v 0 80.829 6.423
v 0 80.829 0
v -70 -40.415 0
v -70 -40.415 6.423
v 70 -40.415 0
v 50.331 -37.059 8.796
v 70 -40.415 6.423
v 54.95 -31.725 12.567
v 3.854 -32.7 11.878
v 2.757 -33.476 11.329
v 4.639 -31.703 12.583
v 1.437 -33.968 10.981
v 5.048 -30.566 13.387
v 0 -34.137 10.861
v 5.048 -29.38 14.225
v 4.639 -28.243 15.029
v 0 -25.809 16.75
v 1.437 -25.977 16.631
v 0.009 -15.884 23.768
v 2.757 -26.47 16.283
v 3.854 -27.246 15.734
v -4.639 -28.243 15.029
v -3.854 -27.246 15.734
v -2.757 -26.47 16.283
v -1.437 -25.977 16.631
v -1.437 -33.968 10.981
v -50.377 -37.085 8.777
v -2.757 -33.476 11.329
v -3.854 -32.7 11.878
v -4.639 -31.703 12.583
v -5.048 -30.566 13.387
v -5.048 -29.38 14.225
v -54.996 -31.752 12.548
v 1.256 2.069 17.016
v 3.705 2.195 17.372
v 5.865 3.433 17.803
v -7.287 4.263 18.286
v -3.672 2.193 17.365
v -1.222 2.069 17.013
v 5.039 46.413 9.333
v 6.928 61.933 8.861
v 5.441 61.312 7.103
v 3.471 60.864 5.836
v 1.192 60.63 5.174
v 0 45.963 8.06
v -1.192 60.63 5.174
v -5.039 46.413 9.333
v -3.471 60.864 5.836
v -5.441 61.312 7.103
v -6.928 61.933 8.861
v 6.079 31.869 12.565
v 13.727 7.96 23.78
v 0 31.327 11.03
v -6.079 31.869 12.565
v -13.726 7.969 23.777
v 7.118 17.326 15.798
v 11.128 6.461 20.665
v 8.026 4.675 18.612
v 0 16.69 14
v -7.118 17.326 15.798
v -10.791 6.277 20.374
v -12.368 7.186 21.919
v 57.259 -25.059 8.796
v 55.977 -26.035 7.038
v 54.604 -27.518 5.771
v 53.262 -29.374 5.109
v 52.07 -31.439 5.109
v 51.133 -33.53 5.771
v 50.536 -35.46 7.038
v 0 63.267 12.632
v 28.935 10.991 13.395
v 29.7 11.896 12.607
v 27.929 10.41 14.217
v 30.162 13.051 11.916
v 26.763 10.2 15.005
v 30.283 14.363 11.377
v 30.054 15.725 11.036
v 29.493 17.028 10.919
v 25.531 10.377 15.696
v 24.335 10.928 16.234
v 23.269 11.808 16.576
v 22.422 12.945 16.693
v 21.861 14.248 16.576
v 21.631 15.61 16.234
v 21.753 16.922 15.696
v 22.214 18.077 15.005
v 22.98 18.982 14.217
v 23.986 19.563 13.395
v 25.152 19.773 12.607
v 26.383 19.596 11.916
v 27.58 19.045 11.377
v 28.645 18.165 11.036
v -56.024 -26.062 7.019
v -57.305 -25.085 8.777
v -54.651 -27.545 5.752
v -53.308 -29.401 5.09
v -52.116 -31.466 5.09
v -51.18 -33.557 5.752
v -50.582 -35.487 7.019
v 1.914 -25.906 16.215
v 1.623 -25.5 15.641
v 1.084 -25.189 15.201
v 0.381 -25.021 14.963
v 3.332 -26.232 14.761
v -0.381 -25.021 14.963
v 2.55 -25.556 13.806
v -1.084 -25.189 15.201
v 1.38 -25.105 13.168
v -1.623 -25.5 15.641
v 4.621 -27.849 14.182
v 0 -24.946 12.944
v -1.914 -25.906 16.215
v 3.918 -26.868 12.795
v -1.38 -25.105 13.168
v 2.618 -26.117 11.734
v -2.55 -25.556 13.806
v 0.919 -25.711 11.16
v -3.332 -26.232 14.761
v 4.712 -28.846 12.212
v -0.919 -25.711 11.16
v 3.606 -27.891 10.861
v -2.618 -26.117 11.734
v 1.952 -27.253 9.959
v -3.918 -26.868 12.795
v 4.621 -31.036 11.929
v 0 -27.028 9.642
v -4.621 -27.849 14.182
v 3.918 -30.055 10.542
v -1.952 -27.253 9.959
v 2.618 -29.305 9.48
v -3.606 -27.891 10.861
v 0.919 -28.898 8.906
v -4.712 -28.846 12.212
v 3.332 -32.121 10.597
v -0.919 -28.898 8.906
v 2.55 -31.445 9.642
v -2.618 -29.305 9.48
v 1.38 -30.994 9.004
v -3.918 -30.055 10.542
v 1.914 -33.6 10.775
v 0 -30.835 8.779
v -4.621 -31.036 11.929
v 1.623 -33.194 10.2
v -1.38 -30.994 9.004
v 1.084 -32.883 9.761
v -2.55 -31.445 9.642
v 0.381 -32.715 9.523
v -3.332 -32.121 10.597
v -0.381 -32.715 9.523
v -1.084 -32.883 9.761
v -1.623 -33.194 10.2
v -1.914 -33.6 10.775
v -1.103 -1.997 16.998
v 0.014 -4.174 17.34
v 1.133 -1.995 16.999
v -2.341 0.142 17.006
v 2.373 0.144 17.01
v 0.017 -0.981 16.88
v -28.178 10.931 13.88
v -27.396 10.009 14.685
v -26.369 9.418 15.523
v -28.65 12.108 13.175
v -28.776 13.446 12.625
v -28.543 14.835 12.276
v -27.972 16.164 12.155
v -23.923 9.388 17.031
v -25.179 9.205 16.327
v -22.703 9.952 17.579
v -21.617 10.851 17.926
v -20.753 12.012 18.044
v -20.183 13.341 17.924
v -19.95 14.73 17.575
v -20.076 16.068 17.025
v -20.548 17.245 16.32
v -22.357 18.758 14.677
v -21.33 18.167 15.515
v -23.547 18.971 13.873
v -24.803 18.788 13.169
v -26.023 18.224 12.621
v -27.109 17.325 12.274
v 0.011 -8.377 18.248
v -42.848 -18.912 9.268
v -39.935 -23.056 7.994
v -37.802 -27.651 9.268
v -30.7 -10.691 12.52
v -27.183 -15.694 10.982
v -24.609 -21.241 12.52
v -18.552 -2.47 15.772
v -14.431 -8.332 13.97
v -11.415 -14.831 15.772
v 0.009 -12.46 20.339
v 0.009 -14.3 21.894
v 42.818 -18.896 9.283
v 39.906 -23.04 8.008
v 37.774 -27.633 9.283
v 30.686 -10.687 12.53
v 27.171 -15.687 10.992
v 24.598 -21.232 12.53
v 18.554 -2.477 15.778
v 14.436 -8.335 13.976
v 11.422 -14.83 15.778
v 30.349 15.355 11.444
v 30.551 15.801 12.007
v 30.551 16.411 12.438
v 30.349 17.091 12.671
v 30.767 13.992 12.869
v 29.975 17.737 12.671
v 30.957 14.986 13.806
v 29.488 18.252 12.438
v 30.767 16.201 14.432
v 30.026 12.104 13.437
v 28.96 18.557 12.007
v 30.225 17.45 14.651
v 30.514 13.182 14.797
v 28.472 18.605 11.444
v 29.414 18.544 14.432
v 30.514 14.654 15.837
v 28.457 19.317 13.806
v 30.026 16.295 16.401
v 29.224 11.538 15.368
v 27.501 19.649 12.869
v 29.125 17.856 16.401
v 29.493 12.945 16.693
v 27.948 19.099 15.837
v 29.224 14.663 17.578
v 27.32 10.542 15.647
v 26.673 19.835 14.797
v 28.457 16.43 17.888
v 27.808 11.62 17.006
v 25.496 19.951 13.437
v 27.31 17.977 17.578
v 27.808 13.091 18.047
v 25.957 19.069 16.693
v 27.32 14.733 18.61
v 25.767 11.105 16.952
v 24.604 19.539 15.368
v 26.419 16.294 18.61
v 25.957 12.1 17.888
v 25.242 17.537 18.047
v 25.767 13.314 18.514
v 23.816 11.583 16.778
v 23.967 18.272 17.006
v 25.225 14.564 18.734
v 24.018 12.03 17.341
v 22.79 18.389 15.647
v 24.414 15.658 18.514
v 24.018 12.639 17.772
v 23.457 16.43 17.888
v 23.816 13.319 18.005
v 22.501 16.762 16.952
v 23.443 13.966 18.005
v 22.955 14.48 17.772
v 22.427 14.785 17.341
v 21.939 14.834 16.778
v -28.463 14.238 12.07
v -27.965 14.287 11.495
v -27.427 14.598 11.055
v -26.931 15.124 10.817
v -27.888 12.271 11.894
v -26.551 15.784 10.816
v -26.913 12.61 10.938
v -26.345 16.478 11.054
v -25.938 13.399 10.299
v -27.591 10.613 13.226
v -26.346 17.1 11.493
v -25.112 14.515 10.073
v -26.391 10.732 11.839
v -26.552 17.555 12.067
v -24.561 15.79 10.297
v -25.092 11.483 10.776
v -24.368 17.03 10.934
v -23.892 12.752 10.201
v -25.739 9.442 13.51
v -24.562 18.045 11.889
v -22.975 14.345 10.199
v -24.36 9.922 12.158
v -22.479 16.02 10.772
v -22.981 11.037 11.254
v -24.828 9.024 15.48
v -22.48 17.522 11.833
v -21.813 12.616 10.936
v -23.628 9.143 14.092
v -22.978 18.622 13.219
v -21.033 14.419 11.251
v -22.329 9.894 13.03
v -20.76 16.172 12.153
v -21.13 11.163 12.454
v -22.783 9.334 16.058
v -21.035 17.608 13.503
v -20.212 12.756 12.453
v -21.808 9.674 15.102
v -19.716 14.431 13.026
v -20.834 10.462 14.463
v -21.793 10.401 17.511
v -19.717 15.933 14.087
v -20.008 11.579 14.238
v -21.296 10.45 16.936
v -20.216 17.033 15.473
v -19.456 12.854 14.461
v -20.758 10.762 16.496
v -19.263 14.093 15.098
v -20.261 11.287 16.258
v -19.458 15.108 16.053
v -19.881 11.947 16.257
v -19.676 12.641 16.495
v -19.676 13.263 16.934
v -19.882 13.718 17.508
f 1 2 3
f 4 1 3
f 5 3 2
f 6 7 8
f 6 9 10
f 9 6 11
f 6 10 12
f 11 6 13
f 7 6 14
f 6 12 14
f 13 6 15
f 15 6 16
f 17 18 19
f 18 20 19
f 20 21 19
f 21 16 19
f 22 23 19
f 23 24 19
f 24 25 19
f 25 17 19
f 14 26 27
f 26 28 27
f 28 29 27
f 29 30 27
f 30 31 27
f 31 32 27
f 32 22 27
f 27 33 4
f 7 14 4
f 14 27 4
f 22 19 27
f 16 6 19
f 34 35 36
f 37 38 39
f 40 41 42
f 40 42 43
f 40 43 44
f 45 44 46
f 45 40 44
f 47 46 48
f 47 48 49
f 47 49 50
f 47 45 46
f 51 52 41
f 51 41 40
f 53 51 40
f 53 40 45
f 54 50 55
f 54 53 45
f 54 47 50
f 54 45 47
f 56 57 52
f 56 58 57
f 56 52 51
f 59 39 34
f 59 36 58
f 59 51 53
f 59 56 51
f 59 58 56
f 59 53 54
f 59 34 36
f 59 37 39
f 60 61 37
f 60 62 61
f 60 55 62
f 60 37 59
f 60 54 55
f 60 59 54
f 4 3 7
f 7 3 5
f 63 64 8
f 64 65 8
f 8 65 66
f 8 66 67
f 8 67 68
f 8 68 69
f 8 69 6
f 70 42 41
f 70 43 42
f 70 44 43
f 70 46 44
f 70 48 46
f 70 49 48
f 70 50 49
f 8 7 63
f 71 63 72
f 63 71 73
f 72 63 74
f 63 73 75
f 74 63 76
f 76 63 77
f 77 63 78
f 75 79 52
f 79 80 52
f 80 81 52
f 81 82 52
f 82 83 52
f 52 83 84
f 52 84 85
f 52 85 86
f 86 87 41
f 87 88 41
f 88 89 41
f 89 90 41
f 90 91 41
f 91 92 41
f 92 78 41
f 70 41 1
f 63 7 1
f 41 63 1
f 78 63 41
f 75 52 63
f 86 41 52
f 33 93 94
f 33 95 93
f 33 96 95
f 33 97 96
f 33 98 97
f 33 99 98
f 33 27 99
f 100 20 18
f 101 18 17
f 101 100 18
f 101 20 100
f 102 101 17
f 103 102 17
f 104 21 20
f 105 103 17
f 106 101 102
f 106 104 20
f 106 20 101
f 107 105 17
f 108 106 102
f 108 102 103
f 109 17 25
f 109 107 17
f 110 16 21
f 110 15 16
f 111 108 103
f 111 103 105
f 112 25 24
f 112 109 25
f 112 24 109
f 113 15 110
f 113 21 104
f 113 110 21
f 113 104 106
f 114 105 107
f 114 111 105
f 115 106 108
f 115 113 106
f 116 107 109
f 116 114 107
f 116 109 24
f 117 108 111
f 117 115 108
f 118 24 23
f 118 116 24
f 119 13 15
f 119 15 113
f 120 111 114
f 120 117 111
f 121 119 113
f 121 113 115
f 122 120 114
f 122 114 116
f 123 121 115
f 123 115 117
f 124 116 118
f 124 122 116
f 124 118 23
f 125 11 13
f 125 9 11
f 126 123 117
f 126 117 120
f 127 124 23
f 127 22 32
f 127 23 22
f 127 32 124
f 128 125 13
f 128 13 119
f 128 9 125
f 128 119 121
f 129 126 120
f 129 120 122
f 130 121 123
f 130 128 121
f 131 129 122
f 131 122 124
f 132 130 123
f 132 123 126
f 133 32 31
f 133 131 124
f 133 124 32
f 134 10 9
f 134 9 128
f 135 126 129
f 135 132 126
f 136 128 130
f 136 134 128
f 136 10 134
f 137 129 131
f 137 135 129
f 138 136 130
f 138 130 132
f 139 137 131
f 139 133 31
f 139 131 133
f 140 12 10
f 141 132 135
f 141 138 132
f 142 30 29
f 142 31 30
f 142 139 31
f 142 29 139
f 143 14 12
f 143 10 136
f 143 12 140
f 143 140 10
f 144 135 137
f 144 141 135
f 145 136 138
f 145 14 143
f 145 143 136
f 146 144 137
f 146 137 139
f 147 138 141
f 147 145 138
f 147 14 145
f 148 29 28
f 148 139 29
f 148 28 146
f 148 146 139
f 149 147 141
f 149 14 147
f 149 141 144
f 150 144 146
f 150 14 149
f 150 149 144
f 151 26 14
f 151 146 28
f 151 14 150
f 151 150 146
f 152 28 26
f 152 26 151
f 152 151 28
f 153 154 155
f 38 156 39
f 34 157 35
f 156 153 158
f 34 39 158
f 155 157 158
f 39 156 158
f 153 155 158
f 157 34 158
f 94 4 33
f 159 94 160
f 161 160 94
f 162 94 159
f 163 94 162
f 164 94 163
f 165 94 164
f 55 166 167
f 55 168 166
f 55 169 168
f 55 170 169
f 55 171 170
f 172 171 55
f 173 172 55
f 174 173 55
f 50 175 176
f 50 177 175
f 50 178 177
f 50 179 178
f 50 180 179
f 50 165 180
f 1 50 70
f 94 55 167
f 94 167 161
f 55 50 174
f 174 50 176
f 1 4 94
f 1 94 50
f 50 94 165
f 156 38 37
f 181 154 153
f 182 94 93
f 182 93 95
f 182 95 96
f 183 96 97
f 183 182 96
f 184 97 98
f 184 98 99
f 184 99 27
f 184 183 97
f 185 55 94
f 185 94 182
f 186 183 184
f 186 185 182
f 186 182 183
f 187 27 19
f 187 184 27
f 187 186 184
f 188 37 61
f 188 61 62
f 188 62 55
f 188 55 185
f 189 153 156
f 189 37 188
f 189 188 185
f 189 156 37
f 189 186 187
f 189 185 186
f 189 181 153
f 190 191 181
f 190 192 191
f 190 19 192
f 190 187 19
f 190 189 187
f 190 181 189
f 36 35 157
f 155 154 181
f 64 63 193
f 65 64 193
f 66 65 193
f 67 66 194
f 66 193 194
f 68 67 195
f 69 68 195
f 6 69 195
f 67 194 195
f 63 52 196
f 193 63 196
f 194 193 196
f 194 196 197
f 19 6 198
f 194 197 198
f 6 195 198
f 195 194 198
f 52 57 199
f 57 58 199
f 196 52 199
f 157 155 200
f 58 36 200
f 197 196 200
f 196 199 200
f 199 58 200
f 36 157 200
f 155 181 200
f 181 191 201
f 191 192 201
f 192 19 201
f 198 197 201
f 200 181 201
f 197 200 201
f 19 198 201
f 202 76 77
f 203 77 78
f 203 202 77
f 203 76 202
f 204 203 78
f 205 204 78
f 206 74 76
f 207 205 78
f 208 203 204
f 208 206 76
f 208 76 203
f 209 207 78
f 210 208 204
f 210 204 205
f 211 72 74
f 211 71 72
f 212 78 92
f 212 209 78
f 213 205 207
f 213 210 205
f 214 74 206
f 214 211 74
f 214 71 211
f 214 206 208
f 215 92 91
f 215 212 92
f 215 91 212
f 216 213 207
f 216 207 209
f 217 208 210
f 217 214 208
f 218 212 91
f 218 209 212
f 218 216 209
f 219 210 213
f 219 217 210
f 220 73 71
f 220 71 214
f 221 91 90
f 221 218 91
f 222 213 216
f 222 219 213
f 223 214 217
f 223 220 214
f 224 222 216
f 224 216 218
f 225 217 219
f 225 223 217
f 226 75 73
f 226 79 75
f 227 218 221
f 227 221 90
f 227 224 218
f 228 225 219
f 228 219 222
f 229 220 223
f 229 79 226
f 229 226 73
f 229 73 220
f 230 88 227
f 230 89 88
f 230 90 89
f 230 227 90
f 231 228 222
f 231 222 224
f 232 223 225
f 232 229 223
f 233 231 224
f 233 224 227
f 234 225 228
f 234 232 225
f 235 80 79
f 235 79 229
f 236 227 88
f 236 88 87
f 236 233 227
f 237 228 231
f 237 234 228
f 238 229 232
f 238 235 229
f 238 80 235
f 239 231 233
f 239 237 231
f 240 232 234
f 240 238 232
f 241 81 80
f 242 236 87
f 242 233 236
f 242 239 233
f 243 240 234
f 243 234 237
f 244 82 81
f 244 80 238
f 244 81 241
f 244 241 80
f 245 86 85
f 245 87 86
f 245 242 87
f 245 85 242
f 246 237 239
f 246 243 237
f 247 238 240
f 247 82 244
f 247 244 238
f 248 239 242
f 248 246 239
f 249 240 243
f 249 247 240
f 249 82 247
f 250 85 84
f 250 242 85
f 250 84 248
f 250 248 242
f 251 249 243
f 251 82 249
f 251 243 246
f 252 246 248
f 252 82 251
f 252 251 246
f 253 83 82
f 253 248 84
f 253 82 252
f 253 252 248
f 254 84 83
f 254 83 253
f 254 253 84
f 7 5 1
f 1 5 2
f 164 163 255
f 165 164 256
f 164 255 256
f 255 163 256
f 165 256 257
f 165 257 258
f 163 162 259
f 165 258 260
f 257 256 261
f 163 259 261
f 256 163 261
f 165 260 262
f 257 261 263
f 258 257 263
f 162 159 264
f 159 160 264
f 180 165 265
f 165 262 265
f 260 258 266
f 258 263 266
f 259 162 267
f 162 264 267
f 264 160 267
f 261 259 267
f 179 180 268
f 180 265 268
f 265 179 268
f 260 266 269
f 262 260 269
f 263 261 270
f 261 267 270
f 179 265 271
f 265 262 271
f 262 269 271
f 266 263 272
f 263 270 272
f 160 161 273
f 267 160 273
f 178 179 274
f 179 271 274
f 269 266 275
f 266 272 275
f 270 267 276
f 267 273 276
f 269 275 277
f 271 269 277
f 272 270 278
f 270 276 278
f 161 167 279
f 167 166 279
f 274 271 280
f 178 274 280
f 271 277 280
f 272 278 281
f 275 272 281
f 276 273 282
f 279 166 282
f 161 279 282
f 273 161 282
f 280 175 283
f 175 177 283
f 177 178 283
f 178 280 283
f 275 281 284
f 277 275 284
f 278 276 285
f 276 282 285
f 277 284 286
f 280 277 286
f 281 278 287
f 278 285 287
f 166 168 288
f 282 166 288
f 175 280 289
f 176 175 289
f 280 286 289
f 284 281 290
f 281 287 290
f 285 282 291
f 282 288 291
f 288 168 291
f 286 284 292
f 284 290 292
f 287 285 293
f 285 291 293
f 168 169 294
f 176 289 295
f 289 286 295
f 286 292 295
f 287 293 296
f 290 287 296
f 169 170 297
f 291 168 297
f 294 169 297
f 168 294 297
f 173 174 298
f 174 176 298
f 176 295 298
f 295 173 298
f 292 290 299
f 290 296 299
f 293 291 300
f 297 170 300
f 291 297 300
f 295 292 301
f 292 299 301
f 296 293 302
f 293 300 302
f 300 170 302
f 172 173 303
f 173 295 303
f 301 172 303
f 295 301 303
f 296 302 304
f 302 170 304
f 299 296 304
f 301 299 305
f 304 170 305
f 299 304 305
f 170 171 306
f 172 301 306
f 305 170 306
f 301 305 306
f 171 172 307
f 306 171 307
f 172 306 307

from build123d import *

# Parameters (mm, degrees)
BOSS_EXTRUDE1_DEPTH = 35
SKETCH17_W          = 133.012031184
SKETCH17_H          = 150.020262135
CUT_EXTRUDE1_DEPTH  = 100
SKETCH18_W          = 192.413181094
SKETCH18_H          = 151.943406229
CUT_EXTRUDE2_DEPTH  = 100
SKETCH19_W          = 213.02940575
SKETCH19_H          = 185.007600509
CUT_EXTRUDE3_DEPTH  = 100


with BuildPart() as part:
    # Sketch1 → Boss-Extrude1 (new body)
    with BuildSketch(Plane.XY):
        Polygon((0, 80.829037687), (-70, -40.414518843), (70, -40.414518843), align=None)
    extrude(amount=BOSS_EXTRUDE1_DEPTH)

    # Sketch17 → Cut-Extrude1 (cut)
    with BuildSketch(Plane(origin=(-14.288690166, 8.249579114, 23.333333333), x_dir=(0.8655579140838772, 0.1356024462386485, 0.4821011034429005), z_dir=(-0.5000000000000012, 0.2886751345948135, 0.8164965809277251))):
        with Locations((-15.800869145, 16.431717582)):
            Rectangle(SKETCH17_W, SKETCH17_H)
    extrude(amount=CUT_EXTRUDE1_DEPTH, mode=Mode.SUBTRACT)

    # Sketch18 → Cut-Extrude2 (cut)
    with BuildSketch(Plane(origin=(0, -16.499158228, 23.333333333), x_dir=(-0.9999855172716196, -0.004394333245699285, -0.003107262836822865), z_dir=(-3.769120432428607e-15, 0.577350269189629, -0.8164965809277238))):
        with Locations((-12.623056854, 9.892836606)):
            Rectangle(SKETCH18_W, SKETCH18_H)
    extrude(amount=-CUT_EXTRUDE2_DEPTH, mode=Mode.SUBTRACT)

    # Sketch19 → Cut-Extrude3 (cut)
    with BuildSketch(Plane(origin=(14.288690166, 8.249579114, 23.333333333), x_dir=(-0.8656985035271668, 0.1407013511718839, 0.48038446141526087), z_dir=(-0.4999999999999998, -0.288675134594816, -0.8164965809277251))):
        with Locations((-1.009116112, 24.341857859)):
            Rectangle(SKETCH19_W, SKETCH19_H)
    extrude(amount=-CUT_EXTRUDE3_DEPTH, mode=Mode.SUBTRACT)

    # Sketch2 → Cut-Revolve3 (revolve, cut)
    with BuildSketch(Plane.XY.offset(35)):
        with BuildLine():
            Line((18.146292999, 0), (-18.146292999, 0))
            ThreePointArc((-18.146292999, 0), (0, 18.146292999), (18.146292999, 0))
        make_face()
    revolve(axis=Axis((0, 0, 35), (1, 0, 0)), mode=Mode.SUBTRACT)

    # Sketch11 → Cut-Revolve7 (revolve, cut)
    with BuildSketch(Plane(origin=(-14.288690166, 8.249579114, 23.333333333), x_dir=(0.865557914083877, 0.13560244623864853, 0.48210110344290047), z_dir=(-0.5000000000000012, 0.2886751345948134, 0.816496580927725))):
        with BuildLine():
            ThreePointArc((0.3071152, -3.71281039), (6.752910141, 3.94358044), (16.277375636, 7.018177971))
            Line((16.277375636, 7.018177971), (14.668951259, 55.949737526))
            Line((14.668951259, 55.949737526), (6.673269744, 55.686912283))
            Line((6.673269744, 55.686912283), (0.3071152, -3.71281039))
        make_face()
    revolve(axis=Axis((0, 17.108489111, 28.951235667), (-2.185767015328875e-15, 0.9428090415820626, -0.33333333333333554)), mode=Mode.SUBTRACT)

    # Sketch3 → Cut-Revolve8 (revolve, cut)
    with BuildSketch(Plane(origin=(14.288690166, 8.249579114, 23.333333333), x_dir=(0.8656985035271669, -0.14070135117188398, -0.4803844614152608), z_dir=(0.4999999999999997, 0.28867513459481586, 0.8164965809277251))):
        with BuildLine():
            Line((45.996636443, -35.376806478), (48.869515746, -27.910444278))
            Line((48.869515746, -27.910444278), (-3.599712524, 1.228268839))
            ThreePointArc((-3.599712524, 1.228268839), (0.992741724, -7.712219863), (0.122393367, -17.725484464))
            Line((0.122393367, -17.725484464), (45.996636443, -35.376806478))
        make_face()
    revolve(axis=Axis((54.949625504, -31.725181077, 12.566909326), (-0.8164965809277288, 0.4714045207910254, 0.3333333333333354)), mode=Mode.SUBTRACT)

    # Sketch10 → Cut-Revolve9 (revolve, cut)
    with BuildSketch(Plane(origin=(0, -16.499158228, 23.333333333), x_dir=(0.9999855172716196, 0.004394333245699285, 0.00310726283682286), z_dir=(3.774324602856538e-15, -0.5773502691896293, 0.8164965809277237))):
        with BuildLine():
            Line((-14.763802711, 9.810092208), (-55.095676422, -18.384483489))
            Line((-55.095676422, -18.384483489), (-50.512095827, -24.941219638))
            Line((-50.512095827, -24.941219638), (3.05684637, 2.301752381))
            ThreePointArc((3.05684637, 2.301752381), (-6.936954181, 3.484349057), (-14.763802711, 9.810092208))
        make_face()
    revolve(axis=Axis((-14.81638619, -8.554244555, 28.951235667), (-0.8164965809277253, -0.471404520791033, -0.3333333333333334)), mode=Mode.SUBTRACT)

    # Sketch13 → Revolve2 (revolve)
    with BuildSketch(Plane(origin=(14.288690166, 8.249579114, 23.333333333), x_dir=(0.8656985035271668, -0.14070135117188393, -0.48038446141526087), z_dir=(0.49999999999999983, 0.2886751345948159, 0.8164965809277251))):
        with BuildLine():
            Line((9.570149417, 6.380099611), (17.89065236, 11.927101574))
            ThreePointArc((17.89065236, 11.927101574), (16.50390187, 4.993349121), (9.570149417, 6.380099611))
        make_face()
    revolve(axis=Axis((35, 20.207259422, 6.422619668), (-0.7071067811865586, -0.40824829046384215, 0.5773502691896272)))

    # Sketch14 → Cut-Revolve10 (revolve, cut)
    with BuildSketch(Plane(origin=(-14.288690166, 8.249579114, 23.333333333), x_dir=(0.865557914083877, 0.13560244623864853, 0.4821011034429005), z_dir=(-0.5000000000000013, 0.2886751345948133, 0.8164965809277251))):
        with BuildLine():
            Line((-7.635267484, 5.061697438), (-16.159640076, 10.663042982))
            ThreePointArc((-16.159640076, 10.663042982), (-14.698126552, 3.600183914), (-7.635267484, 5.061697438))
        make_face()
    revolve(axis=Axis((-35, 20.207259422, 6.422619668), (0.7077422098959172, -0.40714637457257147, 0.5773498021165807)), mode=Mode.SUBTRACT)

    # Sketch16 → Cut-Revolve11 (revolve, cut)
    with BuildSketch(Plane(origin=(0, -16.499158228, 23.333333333), x_dir=(1, 0, 0), z_dir=(3.774324602856538e-15, -0.577350269189629, 0.8164965809277237))):
        with BuildLine():
            Line((0, -21.601888146), (0, -11.401888146))
            ThreePointArc((0, -11.401888146), (5.1, -16.501888146), (0, -21.601888146))
        make_face()
    revolve(axis=Axis((0, -40.414518843, 6.422619668), (-2.2050404815138315e-15, 0.8164965809277238, 0.5773502691896291)), mode=Mode.SUBTRACT)


solid = part.part
